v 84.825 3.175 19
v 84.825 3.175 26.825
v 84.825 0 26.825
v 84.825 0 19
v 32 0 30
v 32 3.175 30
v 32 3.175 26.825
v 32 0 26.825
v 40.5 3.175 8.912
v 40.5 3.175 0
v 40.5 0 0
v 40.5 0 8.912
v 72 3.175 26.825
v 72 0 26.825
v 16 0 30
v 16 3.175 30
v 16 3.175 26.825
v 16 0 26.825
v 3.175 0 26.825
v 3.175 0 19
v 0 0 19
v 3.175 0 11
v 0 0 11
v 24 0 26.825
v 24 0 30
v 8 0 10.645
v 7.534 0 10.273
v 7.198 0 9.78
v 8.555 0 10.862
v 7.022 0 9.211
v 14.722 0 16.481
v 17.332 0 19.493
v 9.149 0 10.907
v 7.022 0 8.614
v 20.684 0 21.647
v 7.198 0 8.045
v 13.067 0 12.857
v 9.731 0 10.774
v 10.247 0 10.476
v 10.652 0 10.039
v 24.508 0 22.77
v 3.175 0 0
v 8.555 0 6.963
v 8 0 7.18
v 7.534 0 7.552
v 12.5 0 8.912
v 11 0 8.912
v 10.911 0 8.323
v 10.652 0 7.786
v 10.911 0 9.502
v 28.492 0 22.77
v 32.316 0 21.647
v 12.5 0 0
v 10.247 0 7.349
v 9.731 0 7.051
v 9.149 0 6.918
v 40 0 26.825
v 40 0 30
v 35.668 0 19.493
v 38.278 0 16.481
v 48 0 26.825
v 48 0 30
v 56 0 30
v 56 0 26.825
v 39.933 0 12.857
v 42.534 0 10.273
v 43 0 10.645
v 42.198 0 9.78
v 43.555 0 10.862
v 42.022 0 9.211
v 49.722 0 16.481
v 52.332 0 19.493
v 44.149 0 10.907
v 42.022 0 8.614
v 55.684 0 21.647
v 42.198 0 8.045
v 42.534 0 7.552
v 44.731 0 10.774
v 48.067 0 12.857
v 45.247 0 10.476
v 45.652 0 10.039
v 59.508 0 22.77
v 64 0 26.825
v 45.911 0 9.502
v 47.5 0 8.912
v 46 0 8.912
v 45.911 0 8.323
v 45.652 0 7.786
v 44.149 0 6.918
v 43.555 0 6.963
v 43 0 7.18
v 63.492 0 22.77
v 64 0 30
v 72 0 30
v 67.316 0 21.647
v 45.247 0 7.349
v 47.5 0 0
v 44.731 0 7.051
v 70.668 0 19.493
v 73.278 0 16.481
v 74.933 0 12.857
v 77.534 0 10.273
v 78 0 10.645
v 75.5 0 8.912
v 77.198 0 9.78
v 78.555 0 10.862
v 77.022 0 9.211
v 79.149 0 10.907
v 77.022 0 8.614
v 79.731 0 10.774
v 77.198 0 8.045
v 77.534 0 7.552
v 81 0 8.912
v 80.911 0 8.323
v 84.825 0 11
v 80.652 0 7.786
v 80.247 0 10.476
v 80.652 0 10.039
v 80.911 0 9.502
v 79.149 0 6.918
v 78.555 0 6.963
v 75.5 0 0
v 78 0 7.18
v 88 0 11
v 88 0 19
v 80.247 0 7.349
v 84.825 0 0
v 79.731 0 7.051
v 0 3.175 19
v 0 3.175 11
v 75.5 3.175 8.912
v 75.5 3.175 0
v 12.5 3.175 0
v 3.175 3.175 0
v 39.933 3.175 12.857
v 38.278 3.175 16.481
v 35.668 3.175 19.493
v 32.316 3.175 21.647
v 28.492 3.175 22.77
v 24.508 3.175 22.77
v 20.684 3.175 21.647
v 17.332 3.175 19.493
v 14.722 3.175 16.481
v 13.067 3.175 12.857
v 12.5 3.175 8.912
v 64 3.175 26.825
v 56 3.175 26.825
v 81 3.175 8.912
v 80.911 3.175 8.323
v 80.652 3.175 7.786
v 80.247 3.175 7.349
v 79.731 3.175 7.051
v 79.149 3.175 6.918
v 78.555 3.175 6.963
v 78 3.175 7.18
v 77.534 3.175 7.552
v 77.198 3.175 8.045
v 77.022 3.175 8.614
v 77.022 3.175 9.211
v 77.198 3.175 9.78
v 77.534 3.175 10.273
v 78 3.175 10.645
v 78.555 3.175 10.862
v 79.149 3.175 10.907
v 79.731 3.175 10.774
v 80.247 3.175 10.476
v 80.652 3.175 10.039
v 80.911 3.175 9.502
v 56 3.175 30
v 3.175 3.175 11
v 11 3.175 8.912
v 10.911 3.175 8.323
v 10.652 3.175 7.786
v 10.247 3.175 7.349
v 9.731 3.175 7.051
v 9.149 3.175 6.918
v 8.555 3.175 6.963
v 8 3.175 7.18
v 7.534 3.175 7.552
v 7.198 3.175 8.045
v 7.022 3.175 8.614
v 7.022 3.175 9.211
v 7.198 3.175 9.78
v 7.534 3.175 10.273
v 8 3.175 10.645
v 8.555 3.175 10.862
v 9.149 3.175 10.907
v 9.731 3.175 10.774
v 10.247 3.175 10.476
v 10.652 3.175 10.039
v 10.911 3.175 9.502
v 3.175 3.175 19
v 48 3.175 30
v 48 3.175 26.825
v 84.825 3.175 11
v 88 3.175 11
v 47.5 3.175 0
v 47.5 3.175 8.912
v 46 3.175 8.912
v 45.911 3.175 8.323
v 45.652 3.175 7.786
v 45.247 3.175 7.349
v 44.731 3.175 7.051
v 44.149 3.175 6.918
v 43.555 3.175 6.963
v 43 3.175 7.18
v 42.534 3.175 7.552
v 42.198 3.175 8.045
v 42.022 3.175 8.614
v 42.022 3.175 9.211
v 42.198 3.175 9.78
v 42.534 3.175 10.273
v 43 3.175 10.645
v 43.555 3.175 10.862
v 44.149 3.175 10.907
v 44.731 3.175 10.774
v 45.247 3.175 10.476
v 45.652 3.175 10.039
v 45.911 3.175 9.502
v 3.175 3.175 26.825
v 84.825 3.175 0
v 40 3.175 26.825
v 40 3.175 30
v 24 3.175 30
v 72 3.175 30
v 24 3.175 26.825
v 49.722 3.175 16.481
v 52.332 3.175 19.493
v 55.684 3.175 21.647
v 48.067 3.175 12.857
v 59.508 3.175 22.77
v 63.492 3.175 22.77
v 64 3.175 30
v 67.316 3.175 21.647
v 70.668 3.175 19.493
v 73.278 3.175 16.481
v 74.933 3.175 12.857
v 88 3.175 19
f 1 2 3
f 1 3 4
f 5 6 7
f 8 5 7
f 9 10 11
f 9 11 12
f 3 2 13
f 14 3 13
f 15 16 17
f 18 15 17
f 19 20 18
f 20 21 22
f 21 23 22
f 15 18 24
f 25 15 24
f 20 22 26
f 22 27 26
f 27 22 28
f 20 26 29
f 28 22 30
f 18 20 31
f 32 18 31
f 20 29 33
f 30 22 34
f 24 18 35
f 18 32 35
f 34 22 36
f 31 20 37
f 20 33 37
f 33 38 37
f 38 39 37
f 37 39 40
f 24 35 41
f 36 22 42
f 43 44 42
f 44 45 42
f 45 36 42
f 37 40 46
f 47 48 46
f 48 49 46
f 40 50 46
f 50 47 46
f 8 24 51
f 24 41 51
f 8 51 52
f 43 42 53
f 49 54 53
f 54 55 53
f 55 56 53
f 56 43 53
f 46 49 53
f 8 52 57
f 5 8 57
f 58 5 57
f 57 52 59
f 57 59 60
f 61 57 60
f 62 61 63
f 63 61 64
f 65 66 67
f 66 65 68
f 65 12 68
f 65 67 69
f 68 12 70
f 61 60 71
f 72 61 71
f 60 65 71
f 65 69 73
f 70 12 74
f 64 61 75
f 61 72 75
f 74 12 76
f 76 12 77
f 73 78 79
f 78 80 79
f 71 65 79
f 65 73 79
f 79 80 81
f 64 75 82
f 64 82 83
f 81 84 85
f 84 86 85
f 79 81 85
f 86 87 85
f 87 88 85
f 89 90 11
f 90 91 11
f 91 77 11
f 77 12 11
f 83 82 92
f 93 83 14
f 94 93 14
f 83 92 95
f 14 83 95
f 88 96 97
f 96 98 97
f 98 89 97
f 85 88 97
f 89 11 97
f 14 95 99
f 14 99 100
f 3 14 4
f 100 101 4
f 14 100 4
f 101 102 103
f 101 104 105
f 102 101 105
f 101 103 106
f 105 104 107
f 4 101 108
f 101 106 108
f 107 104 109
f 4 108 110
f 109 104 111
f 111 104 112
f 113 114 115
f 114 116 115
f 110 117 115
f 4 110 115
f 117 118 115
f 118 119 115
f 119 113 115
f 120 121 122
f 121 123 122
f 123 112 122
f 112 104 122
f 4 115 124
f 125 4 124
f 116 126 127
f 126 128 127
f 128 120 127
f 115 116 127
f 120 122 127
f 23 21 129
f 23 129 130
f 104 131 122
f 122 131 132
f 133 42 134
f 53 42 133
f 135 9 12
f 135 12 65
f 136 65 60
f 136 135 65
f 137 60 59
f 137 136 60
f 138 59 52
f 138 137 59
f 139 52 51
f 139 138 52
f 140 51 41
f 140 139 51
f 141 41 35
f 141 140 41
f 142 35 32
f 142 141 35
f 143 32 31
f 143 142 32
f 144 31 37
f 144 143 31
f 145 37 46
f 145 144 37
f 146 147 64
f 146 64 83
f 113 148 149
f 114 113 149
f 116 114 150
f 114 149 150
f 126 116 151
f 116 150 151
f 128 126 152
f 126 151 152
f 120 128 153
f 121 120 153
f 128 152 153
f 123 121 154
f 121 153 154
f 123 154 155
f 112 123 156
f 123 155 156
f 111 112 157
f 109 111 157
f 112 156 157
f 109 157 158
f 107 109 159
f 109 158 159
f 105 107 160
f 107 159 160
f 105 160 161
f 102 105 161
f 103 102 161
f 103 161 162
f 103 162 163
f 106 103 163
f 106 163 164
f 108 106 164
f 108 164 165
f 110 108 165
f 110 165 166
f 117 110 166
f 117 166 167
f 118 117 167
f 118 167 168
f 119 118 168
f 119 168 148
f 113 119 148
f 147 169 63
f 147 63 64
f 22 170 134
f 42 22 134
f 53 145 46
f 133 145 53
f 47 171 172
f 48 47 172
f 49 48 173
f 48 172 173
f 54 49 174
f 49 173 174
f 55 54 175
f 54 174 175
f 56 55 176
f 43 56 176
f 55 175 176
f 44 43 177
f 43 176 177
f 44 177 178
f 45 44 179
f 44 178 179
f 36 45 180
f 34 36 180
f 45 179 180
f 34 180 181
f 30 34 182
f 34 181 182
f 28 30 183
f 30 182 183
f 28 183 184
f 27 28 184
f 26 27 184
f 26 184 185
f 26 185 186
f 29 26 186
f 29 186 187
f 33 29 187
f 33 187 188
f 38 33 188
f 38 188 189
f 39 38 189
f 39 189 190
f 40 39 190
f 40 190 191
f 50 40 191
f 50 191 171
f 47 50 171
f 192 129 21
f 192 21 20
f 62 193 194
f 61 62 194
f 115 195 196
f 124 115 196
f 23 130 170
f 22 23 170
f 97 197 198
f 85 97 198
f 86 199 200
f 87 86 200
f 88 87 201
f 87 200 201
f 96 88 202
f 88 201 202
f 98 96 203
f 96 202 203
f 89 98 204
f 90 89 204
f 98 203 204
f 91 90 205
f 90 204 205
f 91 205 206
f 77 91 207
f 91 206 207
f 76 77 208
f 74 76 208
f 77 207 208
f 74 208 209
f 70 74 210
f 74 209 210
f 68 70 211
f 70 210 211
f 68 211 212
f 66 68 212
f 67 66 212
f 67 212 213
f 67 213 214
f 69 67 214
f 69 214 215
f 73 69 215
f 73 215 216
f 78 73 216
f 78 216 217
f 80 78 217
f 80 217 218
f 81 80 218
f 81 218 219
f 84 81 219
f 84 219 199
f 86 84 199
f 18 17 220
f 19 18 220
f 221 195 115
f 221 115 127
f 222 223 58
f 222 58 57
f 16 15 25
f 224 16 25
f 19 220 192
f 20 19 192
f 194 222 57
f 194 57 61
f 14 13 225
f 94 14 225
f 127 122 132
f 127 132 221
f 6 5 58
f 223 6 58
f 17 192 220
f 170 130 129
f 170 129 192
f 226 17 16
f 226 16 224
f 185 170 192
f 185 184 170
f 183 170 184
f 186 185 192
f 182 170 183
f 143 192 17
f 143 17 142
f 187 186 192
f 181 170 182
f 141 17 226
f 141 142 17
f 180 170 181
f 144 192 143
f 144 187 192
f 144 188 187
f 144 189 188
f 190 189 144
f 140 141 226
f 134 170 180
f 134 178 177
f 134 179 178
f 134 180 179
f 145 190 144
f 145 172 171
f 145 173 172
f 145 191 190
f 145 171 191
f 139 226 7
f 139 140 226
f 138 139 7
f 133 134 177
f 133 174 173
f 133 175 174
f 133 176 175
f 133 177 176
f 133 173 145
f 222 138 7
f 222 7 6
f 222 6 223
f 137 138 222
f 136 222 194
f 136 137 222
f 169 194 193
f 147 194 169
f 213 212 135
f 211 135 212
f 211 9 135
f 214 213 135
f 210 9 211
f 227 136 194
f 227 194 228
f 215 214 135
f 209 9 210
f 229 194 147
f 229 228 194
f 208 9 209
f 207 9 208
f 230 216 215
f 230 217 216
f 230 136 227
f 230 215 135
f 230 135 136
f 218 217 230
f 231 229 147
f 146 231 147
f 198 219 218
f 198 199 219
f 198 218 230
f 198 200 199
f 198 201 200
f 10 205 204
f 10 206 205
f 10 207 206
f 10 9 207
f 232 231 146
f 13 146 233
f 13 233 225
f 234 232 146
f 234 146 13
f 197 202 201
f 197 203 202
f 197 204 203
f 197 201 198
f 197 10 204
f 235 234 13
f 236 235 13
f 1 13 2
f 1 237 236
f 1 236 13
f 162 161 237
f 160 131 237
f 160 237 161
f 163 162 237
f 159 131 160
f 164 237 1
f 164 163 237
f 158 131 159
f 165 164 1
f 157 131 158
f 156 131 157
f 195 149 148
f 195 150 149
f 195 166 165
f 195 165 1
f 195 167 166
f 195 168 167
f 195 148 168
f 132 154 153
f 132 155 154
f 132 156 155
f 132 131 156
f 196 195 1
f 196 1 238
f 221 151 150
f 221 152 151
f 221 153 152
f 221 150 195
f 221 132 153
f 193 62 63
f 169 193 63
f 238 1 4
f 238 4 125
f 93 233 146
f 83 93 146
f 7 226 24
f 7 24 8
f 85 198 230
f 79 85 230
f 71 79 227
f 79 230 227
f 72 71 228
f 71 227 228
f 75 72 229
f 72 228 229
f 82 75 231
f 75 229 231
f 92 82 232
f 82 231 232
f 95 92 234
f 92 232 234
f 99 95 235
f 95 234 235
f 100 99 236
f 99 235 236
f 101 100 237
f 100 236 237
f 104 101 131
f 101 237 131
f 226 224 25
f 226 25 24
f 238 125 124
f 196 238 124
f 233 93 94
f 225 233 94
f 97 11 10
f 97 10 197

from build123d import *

# Parameters (mm, degrees)
SKETCH3_W           = 88
SKETCH3_H           = 30
BOSS_EXTRUDE1_DEPTH = 3.175
CUT_EXTRUDE1_REACH  = 5.175
SKETCH4_W           = 3.175
SKETCH4_H           = 7.825
SKETCH4_W_2         = 8
SKETCH4_H_2         = 3.175
SKETCH4_H_3         = 11
CUT_EXTRUDE2_REACH  = 5.175
SKETCH5_R           = 2


with BuildPart() as part:
    # Sketch3 → Boss-Extrude1 (new body)
    with BuildSketch(Plane(origin=(0, 0, 0), x_dir=(1, 0, 0), z_dir=(0, 1, 0))):
        with Locations((44, -15)):
            Rectangle(SKETCH3_W, SKETCH3_H)
    extrude(amount=BOSS_EXTRUDE1_DEPTH)

    # Sketch4 → Cut-Extrude1 (cut, up to next)
    with BuildSketch(Plane(origin=(0, 3.175, 0), x_dir=(1, 0, 0), z_dir=(0, 1, 0)), mode=Mode.PRIVATE) as cut_extrude1_sk1:
        with Locations((1.5875, -22.9125)):
            Rectangle(SKETCH4_W, SKETCH4_H)
    cut_extrude1_tool1 = extrude(cut_extrude1_sk1.sketch, amount=-CUT_EXTRUDE1_REACH, mode=Mode.PRIVATE) & part.part
    add(cut_extrude1_tool1.solids().sort_by_distance((1.5875, 3.175, 22.9125))[0], mode=Mode.SUBTRACT)
    # Sketch4 → Cut-Extrude1 (cut, up to next)
    with BuildSketch(Plane(origin=(0, 3.175, 0), x_dir=(1, 0, 0), z_dir=(0, 1, 0)), mode=Mode.PRIVATE) as cut_extrude1_sk2:
        Polygon((0, -30), (16, -30), (16, -26.825), (3.175, -26.825), (0, -26.825), align=None)
    cut_extrude1_tool2 = extrude(cut_extrude1_sk2.sketch, amount=-CUT_EXTRUDE1_REACH, mode=Mode.PRIVATE) & part.part
    add(cut_extrude1_tool2.solids().sort_by_distance((8, 3.175, 28.4125))[0], mode=Mode.SUBTRACT)
    # Sketch4 → Cut-Extrude1 (cut, up to next)
    with BuildSketch(Plane(origin=(0, 3.175, 0), x_dir=(1, 0, 0), z_dir=(0, 1, 0)), mode=Mode.PRIVATE) as cut_extrude1_sk3:
        with Locations((28, -28.4125)):
            Rectangle(SKETCH4_W_2, SKETCH4_H_2)
    cut_extrude1_tool3 = extrude(cut_extrude1_sk3.sketch, amount=-CUT_EXTRUDE1_REACH, mode=Mode.PRIVATE) & part.part
    add(cut_extrude1_tool3.solids().sort_by_distance((28, 3.175, 28.4125))[0], mode=Mode.SUBTRACT)
    # Sketch4 → Cut-Extrude1 (cut, up to next)
    with BuildSketch(Plane(origin=(0, 3.175, 0), x_dir=(1, 0, 0), z_dir=(0, 1, 0)), mode=Mode.PRIVATE) as cut_extrude1_sk4:
        with Locations((44, -28.4125)):
            Rectangle(SKETCH4_W_2, SKETCH4_H_2)
    cut_extrude1_tool4 = extrude(cut_extrude1_sk4.sketch, amount=-CUT_EXTRUDE1_REACH, mode=Mode.PRIVATE) & part.part
    add(cut_extrude1_tool4.solids().sort_by_distance((44, 3.175, 28.4125))[0], mode=Mode.SUBTRACT)
    # Sketch4 → Cut-Extrude1 (cut, up to next)
    with BuildSketch(Plane(origin=(0, 3.175, 0), x_dir=(1, 0, 0), z_dir=(0, 1, 0)), mode=Mode.PRIVATE) as cut_extrude1_sk5:
        with Locations((60, -28.4125)):
            Rectangle(SKETCH4_W_2, SKETCH4_H_2)
    cut_extrude1_tool5 = extrude(cut_extrude1_sk5.sketch, amount=-CUT_EXTRUDE1_REACH, mode=Mode.PRIVATE) & part.part
    add(cut_extrude1_tool5.solids().sort_by_distance((60, 3.175, 28.4125))[0], mode=Mode.SUBTRACT)
    # Sketch4 → Cut-Extrude1 (cut, up to next)
    with BuildSketch(Plane(origin=(0, 3.175, 0), x_dir=(1, 0, 0), z_dir=(0, 1, 0)), mode=Mode.PRIVATE) as cut_extrude1_sk6:
        with Locations((86.4125, -22.9125)):
            Rectangle(SKETCH4_W, SKETCH4_H)
    cut_extrude1_tool6 = extrude(cut_extrude1_sk6.sketch, amount=-CUT_EXTRUDE1_REACH, mode=Mode.PRIVATE) & part.part
    add(cut_extrude1_tool6.solids().sort_by_distance((86.4125, 3.175, 22.9125))[0], mode=Mode.SUBTRACT)
    # Sketch4 → Cut-Extrude1 (cut, up to next)
    with BuildSketch(Plane(origin=(0, 3.175, 0), x_dir=(1, 0, 0), z_dir=(0, 1, 0)), mode=Mode.PRIVATE) as cut_extrude1_sk7:
        with Locations((86.4125, -5.5)):
            Rectangle(SKETCH4_W, SKETCH4_H_3)
    cut_extrude1_tool7 = extrude(cut_extrude1_sk7.sketch, amount=-CUT_EXTRUDE1_REACH, mode=Mode.PRIVATE) & part.part
    add(cut_extrude1_tool7.solids().sort_by_distance((86.4125, 3.175, 5.5))[0], mode=Mode.SUBTRACT)
    # Sketch4 → Cut-Extrude1 (cut, up to next)
    with BuildSketch(Plane(origin=(0, 3.175, 0), x_dir=(1, 0, 0), z_dir=(0, 1, 0)), mode=Mode.PRIVATE) as cut_extrude1_sk8:
        Polygon((72, -26.825), (72, -30), (88, -30), (88, -26.825), (84.825, -26.825), align=None)
    cut_extrude1_tool8 = extrude(cut_extrude1_sk8.sketch, amount=-CUT_EXTRUDE1_REACH, mode=Mode.PRIVATE) & part.part
    add(cut_extrude1_tool8.solids().sort_by_distance((80, 3.175, 28.4125))[0], mode=Mode.SUBTRACT)
    # Sketch4 → Cut-Extrude1 (cut, up to next)
    with BuildSketch(Plane(origin=(0, 3.175, 0), x_dir=(1, 0, 0), z_dir=(0, 1, 0)), mode=Mode.PRIVATE) as cut_extrude1_sk9:
        with Locations((1.5875, -5.5)):
            Rectangle(SKETCH4_W, SKETCH4_H_3)
    cut_extrude1_tool9 = extrude(cut_extrude1_sk9.sketch, amount=-CUT_EXTRUDE1_REACH, mode=Mode.PRIVATE) & part.part
    add(cut_extrude1_tool9.solids().sort_by_distance((1.5875, 3.175, 5.5))[0], mode=Mode.SUBTRACT)

    # Sketch5 → Cut-Extrude2 (cut, up to next)
    with BuildSketch(Plane(origin=(0, 3.175, 0), x_dir=(1, 0, 0), z_dir=(0, 1, 0)), mode=Mode.PRIVATE) as cut_extrude2_sk1:
        with Locations((44, -8.9125)):
            Circle(SKETCH5_R)
    cut_extrude2_tool1 = extrude(cut_extrude2_sk1.sketch, amount=-CUT_EXTRUDE2_REACH, mode=Mode.PRIVATE) & part.part
    add(cut_extrude2_tool1.solids().sort_by_distance((44, 3.175, 8.9125))[0], mode=Mode.SUBTRACT)
    # Sketch5 → Cut-Extrude2 (cut, up to next)
    with BuildSketch(Plane(origin=(0, 3.175, 0), x_dir=(1, 0, 0), z_dir=(0, 1, 0)), mode=Mode.PRIVATE) as cut_extrude2_sk2:
        with Locations((9, -8.9125)):
            Circle(SKETCH5_R)
    cut_extrude2_tool2 = extrude(cut_extrude2_sk2.sketch, amount=-CUT_EXTRUDE2_REACH, mode=Mode.PRIVATE) & part.part
    add(cut_extrude2_tool2.solids().sort_by_distance((9, 3.175, 8.9125))[0], mode=Mode.SUBTRACT)
    # Sketch5 → Cut-Extrude2 (cut, up to next)
    with BuildSketch(Plane(origin=(0, 3.175, 0), x_dir=(1, 0, 0), z_dir=(0, 1, 0)), mode=Mode.PRIVATE) as cut_extrude2_sk3:
        with Locations((79, -8.9125)):
            Circle(SKETCH5_R)
    cut_extrude2_tool3 = extrude(cut_extrude2_sk3.sketch, amount=-CUT_EXTRUDE2_REACH, mode=Mode.PRIVATE) & part.part
    add(cut_extrude2_tool3.solids().sort_by_distance((79, 3.175, 8.9125))[0], mode=Mode.SUBTRACT)
    # Sketch5 → Cut-Extrude2 (cut, up to next)
    with BuildSketch(Plane(origin=(0, 3.175, 0), x_dir=(1, 0, 0), z_dir=(0, 1, 0)), mode=Mode.PRIVATE) as cut_extrude2_sk4:
        with BuildLine():
            Line((75.5, -8.9125), (75.5, 0))
            Line((75.5, 0), (47.5, 0))
            Line((47.5, 0), (47.5, -8.9125))
            ThreePointArc((47.5, -8.9125), (61.5, -22.9125), (75.5, -8.9125))
        make_face()
    cut_extrude2_tool4 = extrude(cut_extrude2_sk4.sketch, amount=-CUT_EXTRUDE2_REACH, mode=Mode.PRIVATE) & part.part
    add(cut_extrude2_tool4.solids().sort_by_distance((61.5, 3.175, 10.199265))[0], mode=Mode.SUBTRACT)
    # Sketch5 → Cut-Extrude2 (cut, up to next)
    with BuildSketch(Plane(origin=(0, 3.175, 0), x_dir=(1, 0, 0), z_dir=(0, 1, 0)), mode=Mode.PRIVATE) as cut_extrude2_sk5:
        with BuildLine():
            Line((12.5, -8.9125), (12.5, 0))
            Line((12.5, 0), (40.5, 0))
            Line((40.5, 0), (40.5, -8.9125))
            ThreePointArc((40.5, -8.9125), (26.5, -22.9125), (12.5, -8.9125))
        make_face()
    cut_extrude2_tool5 = extrude(cut_extrude2_sk5.sketch, amount=-CUT_EXTRUDE2_REACH, mode=Mode.PRIVATE) & part.part
    add(cut_extrude2_tool5.solids().sort_by_distance((26.5, 3.175, 10.199265))[0], mode=Mode.SUBTRACT)


solid = part.part
